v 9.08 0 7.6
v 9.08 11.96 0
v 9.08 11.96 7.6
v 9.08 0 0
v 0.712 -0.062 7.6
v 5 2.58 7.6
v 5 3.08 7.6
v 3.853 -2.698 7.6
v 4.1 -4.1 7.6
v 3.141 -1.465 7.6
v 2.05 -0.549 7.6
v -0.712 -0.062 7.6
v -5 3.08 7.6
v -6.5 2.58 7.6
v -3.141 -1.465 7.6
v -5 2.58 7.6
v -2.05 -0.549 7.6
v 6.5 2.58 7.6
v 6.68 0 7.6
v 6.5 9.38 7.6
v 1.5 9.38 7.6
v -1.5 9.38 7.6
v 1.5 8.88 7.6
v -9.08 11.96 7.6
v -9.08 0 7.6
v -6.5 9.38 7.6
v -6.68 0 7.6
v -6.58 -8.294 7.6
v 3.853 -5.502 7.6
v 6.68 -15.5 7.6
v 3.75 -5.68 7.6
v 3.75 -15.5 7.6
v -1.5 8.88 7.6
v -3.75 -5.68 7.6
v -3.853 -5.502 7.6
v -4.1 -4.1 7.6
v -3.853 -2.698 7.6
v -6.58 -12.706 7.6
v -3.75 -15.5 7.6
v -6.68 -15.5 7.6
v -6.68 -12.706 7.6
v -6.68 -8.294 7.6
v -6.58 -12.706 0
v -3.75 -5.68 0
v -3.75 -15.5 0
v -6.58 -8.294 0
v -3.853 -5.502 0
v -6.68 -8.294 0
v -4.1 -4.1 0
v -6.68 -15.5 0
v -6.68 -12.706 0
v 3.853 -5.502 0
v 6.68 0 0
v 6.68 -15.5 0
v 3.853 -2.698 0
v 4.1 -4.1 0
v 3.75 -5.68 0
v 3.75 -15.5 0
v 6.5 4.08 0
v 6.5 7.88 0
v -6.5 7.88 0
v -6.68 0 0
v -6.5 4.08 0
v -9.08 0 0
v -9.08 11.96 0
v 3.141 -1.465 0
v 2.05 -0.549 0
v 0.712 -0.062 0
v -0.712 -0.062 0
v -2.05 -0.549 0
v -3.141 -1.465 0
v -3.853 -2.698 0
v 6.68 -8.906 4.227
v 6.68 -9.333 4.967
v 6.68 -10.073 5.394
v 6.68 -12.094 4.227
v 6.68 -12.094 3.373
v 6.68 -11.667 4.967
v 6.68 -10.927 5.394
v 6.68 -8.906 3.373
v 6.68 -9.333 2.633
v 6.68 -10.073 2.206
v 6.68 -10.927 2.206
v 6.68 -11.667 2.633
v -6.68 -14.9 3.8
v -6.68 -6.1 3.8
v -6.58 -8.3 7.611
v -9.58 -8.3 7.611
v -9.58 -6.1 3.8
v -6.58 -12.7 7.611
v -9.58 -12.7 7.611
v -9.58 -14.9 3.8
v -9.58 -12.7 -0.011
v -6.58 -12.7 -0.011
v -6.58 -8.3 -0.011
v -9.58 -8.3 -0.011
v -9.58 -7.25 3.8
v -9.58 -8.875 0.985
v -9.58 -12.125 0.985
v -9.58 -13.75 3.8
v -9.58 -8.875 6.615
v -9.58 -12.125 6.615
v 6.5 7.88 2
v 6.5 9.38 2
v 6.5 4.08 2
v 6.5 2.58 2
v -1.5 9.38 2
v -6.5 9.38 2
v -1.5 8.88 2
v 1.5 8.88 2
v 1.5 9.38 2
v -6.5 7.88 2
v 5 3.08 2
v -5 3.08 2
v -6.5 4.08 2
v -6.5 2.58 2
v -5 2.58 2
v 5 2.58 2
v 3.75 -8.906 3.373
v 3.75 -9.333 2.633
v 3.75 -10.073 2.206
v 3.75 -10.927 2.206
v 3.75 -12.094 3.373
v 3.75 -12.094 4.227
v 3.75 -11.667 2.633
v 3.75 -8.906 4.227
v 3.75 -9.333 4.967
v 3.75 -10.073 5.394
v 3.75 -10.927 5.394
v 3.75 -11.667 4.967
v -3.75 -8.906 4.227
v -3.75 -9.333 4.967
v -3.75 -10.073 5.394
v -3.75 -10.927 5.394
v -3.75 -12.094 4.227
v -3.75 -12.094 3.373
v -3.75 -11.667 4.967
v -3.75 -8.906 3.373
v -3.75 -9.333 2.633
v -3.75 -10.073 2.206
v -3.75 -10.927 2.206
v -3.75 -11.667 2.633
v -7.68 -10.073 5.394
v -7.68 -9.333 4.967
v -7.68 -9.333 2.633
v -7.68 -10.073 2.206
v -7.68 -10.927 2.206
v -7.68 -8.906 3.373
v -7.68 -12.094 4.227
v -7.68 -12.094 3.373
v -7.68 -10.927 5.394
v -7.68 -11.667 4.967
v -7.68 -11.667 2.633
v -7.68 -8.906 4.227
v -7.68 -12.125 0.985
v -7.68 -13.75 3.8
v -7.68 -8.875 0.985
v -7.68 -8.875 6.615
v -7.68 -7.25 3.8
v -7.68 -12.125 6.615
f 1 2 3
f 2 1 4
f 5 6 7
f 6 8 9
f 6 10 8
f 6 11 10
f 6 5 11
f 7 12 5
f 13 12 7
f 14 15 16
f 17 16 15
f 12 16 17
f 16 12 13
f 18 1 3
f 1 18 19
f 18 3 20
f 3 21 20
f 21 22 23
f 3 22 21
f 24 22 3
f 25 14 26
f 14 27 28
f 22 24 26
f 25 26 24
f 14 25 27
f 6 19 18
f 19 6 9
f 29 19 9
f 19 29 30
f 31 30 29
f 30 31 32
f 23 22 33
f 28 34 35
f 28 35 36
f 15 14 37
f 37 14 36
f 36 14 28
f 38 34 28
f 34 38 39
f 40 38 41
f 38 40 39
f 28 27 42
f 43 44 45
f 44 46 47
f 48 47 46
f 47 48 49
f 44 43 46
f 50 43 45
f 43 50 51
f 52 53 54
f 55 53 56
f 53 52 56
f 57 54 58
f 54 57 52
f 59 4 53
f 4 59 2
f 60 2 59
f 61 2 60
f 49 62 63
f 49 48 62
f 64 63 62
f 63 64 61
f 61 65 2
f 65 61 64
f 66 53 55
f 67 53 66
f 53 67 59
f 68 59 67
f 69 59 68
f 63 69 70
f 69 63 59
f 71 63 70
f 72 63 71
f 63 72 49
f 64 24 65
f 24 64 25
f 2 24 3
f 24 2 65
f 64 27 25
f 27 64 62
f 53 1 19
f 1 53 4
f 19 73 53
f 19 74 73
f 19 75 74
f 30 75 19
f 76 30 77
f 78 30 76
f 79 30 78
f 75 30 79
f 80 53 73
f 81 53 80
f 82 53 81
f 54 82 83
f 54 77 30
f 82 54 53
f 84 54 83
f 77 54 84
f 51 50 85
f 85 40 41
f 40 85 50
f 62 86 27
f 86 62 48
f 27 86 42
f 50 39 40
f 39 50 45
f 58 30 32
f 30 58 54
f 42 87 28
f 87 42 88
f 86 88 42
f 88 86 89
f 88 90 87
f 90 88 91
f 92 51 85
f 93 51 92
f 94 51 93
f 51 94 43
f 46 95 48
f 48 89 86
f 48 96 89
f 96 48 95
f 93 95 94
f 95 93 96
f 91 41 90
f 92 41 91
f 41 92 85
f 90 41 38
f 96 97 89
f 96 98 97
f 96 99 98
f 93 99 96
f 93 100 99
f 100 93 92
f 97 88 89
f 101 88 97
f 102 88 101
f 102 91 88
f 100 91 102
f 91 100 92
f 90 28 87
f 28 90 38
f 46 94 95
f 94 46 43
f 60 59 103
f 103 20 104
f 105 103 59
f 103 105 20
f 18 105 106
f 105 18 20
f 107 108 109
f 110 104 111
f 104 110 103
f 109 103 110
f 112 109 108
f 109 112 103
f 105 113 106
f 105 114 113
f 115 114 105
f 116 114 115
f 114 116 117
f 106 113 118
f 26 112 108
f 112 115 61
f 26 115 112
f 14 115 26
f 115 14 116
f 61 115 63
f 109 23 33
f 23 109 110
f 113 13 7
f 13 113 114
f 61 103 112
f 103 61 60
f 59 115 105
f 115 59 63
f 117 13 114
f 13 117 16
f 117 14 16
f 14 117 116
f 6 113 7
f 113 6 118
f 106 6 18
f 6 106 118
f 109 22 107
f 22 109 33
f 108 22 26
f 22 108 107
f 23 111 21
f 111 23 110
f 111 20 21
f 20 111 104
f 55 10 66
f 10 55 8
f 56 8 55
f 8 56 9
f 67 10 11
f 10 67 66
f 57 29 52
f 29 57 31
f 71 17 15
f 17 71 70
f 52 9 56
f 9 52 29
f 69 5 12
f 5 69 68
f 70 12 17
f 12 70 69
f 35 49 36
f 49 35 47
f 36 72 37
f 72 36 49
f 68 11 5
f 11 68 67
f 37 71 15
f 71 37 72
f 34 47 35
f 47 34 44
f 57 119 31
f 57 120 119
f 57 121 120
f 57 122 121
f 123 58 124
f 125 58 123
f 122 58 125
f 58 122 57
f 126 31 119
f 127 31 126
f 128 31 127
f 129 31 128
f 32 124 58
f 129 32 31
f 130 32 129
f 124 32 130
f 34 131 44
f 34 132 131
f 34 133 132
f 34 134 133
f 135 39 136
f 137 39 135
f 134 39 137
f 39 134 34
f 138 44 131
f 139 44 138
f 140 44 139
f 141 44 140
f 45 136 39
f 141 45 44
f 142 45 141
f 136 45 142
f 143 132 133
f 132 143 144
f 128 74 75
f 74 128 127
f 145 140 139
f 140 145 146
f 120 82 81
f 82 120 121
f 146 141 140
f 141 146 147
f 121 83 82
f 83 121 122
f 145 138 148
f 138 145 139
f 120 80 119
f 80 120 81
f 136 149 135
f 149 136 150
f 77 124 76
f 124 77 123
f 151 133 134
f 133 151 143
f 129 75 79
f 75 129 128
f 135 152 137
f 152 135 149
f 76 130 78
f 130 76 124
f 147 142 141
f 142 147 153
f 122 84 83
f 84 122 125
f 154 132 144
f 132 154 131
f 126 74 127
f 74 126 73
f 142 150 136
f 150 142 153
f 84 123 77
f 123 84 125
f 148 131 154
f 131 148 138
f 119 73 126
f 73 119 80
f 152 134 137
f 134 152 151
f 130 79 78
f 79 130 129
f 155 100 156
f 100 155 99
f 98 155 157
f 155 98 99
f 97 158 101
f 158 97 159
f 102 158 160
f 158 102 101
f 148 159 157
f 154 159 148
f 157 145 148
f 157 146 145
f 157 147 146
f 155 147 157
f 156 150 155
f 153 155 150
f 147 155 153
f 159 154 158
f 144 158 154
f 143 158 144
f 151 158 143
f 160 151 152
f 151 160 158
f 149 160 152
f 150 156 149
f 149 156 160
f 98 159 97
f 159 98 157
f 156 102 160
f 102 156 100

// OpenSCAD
// PRUSA Mendel  
// Microswitch mount
// Used for mounting tiny microswitches with no lever
// GNU GPL v2
// Ian Stratford
// ginjaian@gmail.com

thin_wall = 0.43;
wall = thin_wall*6;
2wall = wall*2;

ms_x = 13.0; // exact size = 12.8
ms_y = 5.8; // exact size = 5.75
ms_z = 6.6; // exact size = 6.6
m8_diameter = 8.2;
m3_diameter = 3.3;
m3_nut_diameter = 6.5; // normally 6.2mm

module microswitch()
{
	difference()
	{
		union()
		{
		translate ([0,0,0]) cube ([ms_x+2wall,ms_y+2wall+1,ms_z+1]); // microswitch houseing
		translate( [((ms_x+(2wall*2))/2)-((m8_diameter + (2wall*2))/2), -15.5, 0] ) cube( [m8_diameter + 2wall, 17, ms_z+1] ); // clamp
		translate( [ms_x/2-7, -10.5, (ms_z+1)/2] ) rotate( [0, 90, 0] ) rotate ([0,0,30]) cylinder( h = 3, r = (ms_z+2.2) / 2, $fn = 6 ); // captive nut
		}


		translate ([wall,wall+0.5,0]) 
		{
			translate ([0,0,2])cube ([ms_x,ms_y,ms_z]); // microswitch
			translate ([0,1,-.5]) cube ([ms_x,ms_y-2,ms_z+1]); // back slot
		
			translate ([0,-0.5,2]) cube ([1.5,1.5,ms_z]); // removes extra from corners for easier fit
			translate ([ms_x-1.5,-0.5,2]) cube ([1.5,1.5,ms_z]); // removes extra from corners for easier fit
			translate ([0,ms_y-1,2]) cube ([5,1.5,ms_z]); // removes extra from corners for easier fit
			translate ([ms_x-5,ms_y-1,2]) cube ([5,1.5,ms_z]); // removes extra from corners for easier fit
		
		//	translate ([ms_x/2-6.5/2, ms_y+wall+0.5, 3.5]) rotate ([90,22.5,0]) #cylinder (h=ms_y+5.5, r=1.1, $fn=8); // screw hole
		//	translate ([ms_x/2+6.5/2, ms_y+wall+0.5, 3.5]) rotate ([90,22.5,0]) #cylinder (h=ms_y+5.5, r=1.1, $fn=8); // screw hole

		}

		translate( [((ms_x+2wall)/2), -m8_diameter/2, -0.5] ) cylinder( h = ms_z+2, r = m8_diameter/2, $fn = 18 ); // M8 rod hole
		translate( [((ms_x+2wall)/2), -m8_diameter/2-7, (ms_z+1)/2] ) cube( [7.5, 14, ms_z+2], center = true ); // clamp split
		translate( [0, -10.5, (ms_z+1)/2] ) rotate( [0, 90, 0] ) rotate ([0,0,360/24]) cylinder( h = ms_x+4, r = m3_diameter / 2, $fn = 12 ); // clamp bolt hole
		translate( [ms_x/2-7.5, -10.5, (ms_z+1)/2] ) rotate( [0, 90, 0] ) rotate ([0,0,30]) cylinder( h = 2.4, r = m3_nut_diameter/2 , $fn = 6 ); // captive nut cut out

	}
}

translate ([-ms_x/2-wall,0,0]) microswitch();
